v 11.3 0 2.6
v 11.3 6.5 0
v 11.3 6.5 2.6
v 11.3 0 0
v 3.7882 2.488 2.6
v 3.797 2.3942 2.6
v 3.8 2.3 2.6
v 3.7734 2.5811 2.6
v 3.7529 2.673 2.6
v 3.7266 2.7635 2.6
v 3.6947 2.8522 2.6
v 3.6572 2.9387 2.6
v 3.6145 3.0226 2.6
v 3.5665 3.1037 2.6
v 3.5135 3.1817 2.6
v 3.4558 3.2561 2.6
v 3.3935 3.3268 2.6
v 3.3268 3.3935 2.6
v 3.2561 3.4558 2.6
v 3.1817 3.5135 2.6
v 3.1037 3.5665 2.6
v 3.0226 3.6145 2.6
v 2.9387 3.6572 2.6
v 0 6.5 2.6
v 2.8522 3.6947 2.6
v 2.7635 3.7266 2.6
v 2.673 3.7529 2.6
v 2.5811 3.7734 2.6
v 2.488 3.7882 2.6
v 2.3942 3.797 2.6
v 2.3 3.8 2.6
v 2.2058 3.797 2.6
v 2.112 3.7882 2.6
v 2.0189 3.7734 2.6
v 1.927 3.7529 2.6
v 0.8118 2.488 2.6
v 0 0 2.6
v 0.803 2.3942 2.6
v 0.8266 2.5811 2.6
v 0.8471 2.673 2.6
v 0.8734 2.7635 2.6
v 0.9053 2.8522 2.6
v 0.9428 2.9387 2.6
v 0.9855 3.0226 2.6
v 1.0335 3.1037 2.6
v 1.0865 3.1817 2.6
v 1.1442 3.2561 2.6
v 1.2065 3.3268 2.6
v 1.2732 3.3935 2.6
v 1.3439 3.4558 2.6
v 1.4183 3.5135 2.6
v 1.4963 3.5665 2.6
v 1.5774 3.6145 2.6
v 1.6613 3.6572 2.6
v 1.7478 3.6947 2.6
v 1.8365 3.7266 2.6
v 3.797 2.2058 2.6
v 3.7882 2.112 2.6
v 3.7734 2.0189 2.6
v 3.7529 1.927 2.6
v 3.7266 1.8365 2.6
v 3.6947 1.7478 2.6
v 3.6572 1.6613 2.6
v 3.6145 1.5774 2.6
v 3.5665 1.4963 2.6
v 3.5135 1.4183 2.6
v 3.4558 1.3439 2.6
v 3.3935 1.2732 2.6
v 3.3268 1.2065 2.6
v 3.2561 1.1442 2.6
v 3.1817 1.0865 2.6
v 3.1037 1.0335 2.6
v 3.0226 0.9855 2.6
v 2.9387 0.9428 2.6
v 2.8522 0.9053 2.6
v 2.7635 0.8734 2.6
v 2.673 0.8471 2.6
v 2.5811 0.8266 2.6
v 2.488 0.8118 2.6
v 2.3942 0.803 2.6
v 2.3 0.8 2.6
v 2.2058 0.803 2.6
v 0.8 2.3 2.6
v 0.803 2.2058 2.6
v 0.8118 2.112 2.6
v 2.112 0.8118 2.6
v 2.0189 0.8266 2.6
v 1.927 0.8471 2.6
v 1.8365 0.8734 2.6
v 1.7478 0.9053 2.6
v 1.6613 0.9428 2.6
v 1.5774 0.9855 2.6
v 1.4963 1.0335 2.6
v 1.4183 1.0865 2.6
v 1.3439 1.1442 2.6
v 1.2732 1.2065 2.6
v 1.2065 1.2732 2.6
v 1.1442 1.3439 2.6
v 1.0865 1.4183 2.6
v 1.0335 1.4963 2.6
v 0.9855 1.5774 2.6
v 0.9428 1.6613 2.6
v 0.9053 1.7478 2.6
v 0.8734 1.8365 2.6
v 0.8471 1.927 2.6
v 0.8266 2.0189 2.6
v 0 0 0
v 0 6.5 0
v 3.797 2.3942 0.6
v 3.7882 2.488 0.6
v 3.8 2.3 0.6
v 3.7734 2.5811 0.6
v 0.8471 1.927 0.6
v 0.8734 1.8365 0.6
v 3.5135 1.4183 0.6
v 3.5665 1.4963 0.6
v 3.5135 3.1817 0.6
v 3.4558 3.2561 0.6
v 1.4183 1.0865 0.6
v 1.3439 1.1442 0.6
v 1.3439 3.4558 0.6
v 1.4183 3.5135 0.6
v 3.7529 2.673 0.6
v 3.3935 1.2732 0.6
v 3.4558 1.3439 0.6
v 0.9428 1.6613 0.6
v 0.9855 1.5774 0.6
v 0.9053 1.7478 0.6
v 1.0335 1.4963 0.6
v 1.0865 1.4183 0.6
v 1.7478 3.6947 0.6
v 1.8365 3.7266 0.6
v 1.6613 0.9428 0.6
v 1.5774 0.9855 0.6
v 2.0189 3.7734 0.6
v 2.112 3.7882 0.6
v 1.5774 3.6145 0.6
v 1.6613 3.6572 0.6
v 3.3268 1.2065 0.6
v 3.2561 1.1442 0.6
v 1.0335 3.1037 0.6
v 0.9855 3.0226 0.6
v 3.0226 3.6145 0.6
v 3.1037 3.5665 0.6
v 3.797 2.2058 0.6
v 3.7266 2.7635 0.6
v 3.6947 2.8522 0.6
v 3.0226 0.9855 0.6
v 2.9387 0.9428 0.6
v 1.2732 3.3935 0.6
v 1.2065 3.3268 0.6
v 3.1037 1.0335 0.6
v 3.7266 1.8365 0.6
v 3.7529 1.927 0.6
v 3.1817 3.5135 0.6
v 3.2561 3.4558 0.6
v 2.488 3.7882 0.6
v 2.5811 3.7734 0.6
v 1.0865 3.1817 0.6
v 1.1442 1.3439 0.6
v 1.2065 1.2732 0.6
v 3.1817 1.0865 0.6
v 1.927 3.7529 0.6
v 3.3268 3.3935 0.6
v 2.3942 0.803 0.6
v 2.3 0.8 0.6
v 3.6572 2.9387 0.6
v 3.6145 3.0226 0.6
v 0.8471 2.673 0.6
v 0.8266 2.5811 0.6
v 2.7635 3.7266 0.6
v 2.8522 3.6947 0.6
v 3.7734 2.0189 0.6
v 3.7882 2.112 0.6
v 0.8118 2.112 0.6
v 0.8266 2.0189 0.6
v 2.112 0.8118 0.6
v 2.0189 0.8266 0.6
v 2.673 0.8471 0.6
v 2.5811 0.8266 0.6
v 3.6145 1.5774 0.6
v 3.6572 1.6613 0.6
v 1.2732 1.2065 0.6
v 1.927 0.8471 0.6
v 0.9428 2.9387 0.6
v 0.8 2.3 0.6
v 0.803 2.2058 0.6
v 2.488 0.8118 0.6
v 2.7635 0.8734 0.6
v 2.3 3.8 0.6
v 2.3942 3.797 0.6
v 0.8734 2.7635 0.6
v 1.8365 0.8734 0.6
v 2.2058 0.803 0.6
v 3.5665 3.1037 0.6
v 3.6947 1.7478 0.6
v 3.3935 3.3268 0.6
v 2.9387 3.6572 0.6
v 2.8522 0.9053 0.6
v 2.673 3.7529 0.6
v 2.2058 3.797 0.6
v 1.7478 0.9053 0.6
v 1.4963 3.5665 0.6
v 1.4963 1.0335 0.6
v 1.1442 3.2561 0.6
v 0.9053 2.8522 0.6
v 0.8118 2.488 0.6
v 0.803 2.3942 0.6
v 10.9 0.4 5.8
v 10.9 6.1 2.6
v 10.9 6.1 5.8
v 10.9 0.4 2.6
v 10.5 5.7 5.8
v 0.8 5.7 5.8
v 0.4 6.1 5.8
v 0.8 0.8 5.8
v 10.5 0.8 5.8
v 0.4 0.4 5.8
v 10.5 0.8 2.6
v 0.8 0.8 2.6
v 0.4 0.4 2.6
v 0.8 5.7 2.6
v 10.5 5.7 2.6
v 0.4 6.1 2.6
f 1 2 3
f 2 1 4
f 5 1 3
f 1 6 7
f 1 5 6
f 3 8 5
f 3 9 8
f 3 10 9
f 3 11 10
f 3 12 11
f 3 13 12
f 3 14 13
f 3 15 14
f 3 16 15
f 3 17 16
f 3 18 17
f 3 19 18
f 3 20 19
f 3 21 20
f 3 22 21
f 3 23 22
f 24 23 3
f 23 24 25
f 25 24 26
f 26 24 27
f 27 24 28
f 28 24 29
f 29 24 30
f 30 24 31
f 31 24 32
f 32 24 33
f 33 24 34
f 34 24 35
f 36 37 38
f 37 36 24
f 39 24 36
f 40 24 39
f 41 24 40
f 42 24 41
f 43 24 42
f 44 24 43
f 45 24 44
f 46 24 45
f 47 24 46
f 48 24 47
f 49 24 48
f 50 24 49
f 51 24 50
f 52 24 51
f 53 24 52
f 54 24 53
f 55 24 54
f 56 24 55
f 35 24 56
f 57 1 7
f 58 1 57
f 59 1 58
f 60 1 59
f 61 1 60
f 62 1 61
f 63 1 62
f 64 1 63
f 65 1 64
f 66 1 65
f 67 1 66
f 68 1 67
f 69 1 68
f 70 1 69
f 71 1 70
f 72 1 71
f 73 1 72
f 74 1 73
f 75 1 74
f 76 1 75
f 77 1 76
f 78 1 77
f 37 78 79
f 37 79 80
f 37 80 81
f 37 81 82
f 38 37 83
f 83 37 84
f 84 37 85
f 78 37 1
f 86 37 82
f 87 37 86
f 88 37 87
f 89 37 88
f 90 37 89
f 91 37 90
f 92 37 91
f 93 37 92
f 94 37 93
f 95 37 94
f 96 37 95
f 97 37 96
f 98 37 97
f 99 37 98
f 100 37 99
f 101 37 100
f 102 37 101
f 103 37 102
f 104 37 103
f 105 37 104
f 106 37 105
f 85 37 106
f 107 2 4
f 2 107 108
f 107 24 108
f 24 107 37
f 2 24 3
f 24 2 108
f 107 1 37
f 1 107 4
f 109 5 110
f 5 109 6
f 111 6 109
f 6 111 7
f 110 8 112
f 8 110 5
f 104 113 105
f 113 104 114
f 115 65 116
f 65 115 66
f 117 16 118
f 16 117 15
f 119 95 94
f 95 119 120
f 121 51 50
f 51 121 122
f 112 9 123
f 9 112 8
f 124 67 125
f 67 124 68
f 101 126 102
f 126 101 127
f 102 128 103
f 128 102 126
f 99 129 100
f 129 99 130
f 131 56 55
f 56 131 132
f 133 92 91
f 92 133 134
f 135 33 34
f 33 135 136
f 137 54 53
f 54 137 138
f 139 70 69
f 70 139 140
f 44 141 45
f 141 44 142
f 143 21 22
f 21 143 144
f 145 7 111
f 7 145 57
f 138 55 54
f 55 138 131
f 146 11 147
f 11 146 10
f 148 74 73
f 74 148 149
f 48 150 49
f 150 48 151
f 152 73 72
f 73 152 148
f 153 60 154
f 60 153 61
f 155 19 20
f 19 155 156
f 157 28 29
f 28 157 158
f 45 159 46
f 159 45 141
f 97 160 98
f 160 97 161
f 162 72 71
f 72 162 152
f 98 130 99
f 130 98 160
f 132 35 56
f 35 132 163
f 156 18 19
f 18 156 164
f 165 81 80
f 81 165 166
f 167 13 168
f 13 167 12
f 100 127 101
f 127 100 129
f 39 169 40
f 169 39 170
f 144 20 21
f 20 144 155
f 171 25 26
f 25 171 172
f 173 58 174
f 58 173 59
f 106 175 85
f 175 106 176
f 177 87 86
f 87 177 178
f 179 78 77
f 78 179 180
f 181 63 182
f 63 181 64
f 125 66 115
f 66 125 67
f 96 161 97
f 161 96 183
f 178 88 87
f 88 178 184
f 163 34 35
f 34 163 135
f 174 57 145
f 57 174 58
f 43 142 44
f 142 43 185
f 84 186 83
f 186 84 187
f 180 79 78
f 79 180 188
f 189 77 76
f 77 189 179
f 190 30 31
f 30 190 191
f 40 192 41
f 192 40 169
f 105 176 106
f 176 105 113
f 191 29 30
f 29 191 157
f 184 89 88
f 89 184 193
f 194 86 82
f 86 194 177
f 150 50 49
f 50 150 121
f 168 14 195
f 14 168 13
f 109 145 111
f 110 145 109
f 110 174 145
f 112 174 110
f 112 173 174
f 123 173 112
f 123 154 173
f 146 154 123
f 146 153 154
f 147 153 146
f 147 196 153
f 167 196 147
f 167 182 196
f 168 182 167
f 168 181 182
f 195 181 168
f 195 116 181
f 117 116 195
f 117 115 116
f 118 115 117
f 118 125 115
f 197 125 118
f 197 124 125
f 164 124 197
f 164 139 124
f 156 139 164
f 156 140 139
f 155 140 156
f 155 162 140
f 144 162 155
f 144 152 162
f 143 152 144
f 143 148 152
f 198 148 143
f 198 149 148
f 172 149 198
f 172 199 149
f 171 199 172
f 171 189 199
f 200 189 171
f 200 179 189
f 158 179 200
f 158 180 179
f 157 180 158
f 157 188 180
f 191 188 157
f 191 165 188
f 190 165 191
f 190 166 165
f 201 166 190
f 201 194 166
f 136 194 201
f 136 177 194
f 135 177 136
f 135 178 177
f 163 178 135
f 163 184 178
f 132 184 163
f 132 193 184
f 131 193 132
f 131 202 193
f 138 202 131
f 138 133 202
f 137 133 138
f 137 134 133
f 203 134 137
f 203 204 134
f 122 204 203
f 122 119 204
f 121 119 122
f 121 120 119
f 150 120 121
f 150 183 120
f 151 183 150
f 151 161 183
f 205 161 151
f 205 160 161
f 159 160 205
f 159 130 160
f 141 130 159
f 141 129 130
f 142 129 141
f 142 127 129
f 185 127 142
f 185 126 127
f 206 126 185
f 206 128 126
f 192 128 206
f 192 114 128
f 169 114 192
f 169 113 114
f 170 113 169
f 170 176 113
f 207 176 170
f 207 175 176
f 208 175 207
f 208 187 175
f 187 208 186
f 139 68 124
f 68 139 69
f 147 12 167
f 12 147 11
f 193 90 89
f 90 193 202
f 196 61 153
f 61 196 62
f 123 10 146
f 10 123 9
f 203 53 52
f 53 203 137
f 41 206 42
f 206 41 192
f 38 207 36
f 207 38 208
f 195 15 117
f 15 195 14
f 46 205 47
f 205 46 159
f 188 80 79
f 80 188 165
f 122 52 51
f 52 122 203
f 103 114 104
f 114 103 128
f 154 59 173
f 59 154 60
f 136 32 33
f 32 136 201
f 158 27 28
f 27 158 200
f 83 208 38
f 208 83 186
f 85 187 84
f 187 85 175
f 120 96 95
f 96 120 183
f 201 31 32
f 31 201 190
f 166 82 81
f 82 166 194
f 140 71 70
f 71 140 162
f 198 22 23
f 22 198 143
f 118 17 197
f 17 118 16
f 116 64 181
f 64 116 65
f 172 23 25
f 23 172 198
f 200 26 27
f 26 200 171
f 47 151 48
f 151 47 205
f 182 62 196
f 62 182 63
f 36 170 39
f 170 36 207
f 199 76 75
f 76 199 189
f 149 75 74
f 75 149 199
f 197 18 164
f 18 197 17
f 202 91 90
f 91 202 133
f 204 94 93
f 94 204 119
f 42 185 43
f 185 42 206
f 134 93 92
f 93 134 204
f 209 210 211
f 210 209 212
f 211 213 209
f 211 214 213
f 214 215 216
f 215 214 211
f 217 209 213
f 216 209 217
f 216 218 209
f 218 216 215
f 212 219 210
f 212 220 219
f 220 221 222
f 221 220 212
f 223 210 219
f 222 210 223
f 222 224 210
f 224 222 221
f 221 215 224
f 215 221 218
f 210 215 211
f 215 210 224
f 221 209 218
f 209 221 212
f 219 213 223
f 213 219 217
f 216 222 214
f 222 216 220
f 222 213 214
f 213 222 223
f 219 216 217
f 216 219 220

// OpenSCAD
$fn = 100;

width = 9.7;
depth = 4.9;
base_thickness = 0.8;
wrapper_thickness = 0.4;

difference() {
  t = base_thickness;

  cube([width + t * 2, depth + t * 2, 2.6]);
  translate([1.5 + t, 1.5 + t, 0.6]) cylinder(d = 3, h = 2.1);
}

translate([base_thickness / 2, base_thickness / 2, 2.6]) difference() {
  t = wrapper_thickness;

  cube([width + t * 2, depth + t * 2, 3.2]);
  translate([t, t, -0.1]) cube([width, depth, 3.2 + 0.2]);
}
